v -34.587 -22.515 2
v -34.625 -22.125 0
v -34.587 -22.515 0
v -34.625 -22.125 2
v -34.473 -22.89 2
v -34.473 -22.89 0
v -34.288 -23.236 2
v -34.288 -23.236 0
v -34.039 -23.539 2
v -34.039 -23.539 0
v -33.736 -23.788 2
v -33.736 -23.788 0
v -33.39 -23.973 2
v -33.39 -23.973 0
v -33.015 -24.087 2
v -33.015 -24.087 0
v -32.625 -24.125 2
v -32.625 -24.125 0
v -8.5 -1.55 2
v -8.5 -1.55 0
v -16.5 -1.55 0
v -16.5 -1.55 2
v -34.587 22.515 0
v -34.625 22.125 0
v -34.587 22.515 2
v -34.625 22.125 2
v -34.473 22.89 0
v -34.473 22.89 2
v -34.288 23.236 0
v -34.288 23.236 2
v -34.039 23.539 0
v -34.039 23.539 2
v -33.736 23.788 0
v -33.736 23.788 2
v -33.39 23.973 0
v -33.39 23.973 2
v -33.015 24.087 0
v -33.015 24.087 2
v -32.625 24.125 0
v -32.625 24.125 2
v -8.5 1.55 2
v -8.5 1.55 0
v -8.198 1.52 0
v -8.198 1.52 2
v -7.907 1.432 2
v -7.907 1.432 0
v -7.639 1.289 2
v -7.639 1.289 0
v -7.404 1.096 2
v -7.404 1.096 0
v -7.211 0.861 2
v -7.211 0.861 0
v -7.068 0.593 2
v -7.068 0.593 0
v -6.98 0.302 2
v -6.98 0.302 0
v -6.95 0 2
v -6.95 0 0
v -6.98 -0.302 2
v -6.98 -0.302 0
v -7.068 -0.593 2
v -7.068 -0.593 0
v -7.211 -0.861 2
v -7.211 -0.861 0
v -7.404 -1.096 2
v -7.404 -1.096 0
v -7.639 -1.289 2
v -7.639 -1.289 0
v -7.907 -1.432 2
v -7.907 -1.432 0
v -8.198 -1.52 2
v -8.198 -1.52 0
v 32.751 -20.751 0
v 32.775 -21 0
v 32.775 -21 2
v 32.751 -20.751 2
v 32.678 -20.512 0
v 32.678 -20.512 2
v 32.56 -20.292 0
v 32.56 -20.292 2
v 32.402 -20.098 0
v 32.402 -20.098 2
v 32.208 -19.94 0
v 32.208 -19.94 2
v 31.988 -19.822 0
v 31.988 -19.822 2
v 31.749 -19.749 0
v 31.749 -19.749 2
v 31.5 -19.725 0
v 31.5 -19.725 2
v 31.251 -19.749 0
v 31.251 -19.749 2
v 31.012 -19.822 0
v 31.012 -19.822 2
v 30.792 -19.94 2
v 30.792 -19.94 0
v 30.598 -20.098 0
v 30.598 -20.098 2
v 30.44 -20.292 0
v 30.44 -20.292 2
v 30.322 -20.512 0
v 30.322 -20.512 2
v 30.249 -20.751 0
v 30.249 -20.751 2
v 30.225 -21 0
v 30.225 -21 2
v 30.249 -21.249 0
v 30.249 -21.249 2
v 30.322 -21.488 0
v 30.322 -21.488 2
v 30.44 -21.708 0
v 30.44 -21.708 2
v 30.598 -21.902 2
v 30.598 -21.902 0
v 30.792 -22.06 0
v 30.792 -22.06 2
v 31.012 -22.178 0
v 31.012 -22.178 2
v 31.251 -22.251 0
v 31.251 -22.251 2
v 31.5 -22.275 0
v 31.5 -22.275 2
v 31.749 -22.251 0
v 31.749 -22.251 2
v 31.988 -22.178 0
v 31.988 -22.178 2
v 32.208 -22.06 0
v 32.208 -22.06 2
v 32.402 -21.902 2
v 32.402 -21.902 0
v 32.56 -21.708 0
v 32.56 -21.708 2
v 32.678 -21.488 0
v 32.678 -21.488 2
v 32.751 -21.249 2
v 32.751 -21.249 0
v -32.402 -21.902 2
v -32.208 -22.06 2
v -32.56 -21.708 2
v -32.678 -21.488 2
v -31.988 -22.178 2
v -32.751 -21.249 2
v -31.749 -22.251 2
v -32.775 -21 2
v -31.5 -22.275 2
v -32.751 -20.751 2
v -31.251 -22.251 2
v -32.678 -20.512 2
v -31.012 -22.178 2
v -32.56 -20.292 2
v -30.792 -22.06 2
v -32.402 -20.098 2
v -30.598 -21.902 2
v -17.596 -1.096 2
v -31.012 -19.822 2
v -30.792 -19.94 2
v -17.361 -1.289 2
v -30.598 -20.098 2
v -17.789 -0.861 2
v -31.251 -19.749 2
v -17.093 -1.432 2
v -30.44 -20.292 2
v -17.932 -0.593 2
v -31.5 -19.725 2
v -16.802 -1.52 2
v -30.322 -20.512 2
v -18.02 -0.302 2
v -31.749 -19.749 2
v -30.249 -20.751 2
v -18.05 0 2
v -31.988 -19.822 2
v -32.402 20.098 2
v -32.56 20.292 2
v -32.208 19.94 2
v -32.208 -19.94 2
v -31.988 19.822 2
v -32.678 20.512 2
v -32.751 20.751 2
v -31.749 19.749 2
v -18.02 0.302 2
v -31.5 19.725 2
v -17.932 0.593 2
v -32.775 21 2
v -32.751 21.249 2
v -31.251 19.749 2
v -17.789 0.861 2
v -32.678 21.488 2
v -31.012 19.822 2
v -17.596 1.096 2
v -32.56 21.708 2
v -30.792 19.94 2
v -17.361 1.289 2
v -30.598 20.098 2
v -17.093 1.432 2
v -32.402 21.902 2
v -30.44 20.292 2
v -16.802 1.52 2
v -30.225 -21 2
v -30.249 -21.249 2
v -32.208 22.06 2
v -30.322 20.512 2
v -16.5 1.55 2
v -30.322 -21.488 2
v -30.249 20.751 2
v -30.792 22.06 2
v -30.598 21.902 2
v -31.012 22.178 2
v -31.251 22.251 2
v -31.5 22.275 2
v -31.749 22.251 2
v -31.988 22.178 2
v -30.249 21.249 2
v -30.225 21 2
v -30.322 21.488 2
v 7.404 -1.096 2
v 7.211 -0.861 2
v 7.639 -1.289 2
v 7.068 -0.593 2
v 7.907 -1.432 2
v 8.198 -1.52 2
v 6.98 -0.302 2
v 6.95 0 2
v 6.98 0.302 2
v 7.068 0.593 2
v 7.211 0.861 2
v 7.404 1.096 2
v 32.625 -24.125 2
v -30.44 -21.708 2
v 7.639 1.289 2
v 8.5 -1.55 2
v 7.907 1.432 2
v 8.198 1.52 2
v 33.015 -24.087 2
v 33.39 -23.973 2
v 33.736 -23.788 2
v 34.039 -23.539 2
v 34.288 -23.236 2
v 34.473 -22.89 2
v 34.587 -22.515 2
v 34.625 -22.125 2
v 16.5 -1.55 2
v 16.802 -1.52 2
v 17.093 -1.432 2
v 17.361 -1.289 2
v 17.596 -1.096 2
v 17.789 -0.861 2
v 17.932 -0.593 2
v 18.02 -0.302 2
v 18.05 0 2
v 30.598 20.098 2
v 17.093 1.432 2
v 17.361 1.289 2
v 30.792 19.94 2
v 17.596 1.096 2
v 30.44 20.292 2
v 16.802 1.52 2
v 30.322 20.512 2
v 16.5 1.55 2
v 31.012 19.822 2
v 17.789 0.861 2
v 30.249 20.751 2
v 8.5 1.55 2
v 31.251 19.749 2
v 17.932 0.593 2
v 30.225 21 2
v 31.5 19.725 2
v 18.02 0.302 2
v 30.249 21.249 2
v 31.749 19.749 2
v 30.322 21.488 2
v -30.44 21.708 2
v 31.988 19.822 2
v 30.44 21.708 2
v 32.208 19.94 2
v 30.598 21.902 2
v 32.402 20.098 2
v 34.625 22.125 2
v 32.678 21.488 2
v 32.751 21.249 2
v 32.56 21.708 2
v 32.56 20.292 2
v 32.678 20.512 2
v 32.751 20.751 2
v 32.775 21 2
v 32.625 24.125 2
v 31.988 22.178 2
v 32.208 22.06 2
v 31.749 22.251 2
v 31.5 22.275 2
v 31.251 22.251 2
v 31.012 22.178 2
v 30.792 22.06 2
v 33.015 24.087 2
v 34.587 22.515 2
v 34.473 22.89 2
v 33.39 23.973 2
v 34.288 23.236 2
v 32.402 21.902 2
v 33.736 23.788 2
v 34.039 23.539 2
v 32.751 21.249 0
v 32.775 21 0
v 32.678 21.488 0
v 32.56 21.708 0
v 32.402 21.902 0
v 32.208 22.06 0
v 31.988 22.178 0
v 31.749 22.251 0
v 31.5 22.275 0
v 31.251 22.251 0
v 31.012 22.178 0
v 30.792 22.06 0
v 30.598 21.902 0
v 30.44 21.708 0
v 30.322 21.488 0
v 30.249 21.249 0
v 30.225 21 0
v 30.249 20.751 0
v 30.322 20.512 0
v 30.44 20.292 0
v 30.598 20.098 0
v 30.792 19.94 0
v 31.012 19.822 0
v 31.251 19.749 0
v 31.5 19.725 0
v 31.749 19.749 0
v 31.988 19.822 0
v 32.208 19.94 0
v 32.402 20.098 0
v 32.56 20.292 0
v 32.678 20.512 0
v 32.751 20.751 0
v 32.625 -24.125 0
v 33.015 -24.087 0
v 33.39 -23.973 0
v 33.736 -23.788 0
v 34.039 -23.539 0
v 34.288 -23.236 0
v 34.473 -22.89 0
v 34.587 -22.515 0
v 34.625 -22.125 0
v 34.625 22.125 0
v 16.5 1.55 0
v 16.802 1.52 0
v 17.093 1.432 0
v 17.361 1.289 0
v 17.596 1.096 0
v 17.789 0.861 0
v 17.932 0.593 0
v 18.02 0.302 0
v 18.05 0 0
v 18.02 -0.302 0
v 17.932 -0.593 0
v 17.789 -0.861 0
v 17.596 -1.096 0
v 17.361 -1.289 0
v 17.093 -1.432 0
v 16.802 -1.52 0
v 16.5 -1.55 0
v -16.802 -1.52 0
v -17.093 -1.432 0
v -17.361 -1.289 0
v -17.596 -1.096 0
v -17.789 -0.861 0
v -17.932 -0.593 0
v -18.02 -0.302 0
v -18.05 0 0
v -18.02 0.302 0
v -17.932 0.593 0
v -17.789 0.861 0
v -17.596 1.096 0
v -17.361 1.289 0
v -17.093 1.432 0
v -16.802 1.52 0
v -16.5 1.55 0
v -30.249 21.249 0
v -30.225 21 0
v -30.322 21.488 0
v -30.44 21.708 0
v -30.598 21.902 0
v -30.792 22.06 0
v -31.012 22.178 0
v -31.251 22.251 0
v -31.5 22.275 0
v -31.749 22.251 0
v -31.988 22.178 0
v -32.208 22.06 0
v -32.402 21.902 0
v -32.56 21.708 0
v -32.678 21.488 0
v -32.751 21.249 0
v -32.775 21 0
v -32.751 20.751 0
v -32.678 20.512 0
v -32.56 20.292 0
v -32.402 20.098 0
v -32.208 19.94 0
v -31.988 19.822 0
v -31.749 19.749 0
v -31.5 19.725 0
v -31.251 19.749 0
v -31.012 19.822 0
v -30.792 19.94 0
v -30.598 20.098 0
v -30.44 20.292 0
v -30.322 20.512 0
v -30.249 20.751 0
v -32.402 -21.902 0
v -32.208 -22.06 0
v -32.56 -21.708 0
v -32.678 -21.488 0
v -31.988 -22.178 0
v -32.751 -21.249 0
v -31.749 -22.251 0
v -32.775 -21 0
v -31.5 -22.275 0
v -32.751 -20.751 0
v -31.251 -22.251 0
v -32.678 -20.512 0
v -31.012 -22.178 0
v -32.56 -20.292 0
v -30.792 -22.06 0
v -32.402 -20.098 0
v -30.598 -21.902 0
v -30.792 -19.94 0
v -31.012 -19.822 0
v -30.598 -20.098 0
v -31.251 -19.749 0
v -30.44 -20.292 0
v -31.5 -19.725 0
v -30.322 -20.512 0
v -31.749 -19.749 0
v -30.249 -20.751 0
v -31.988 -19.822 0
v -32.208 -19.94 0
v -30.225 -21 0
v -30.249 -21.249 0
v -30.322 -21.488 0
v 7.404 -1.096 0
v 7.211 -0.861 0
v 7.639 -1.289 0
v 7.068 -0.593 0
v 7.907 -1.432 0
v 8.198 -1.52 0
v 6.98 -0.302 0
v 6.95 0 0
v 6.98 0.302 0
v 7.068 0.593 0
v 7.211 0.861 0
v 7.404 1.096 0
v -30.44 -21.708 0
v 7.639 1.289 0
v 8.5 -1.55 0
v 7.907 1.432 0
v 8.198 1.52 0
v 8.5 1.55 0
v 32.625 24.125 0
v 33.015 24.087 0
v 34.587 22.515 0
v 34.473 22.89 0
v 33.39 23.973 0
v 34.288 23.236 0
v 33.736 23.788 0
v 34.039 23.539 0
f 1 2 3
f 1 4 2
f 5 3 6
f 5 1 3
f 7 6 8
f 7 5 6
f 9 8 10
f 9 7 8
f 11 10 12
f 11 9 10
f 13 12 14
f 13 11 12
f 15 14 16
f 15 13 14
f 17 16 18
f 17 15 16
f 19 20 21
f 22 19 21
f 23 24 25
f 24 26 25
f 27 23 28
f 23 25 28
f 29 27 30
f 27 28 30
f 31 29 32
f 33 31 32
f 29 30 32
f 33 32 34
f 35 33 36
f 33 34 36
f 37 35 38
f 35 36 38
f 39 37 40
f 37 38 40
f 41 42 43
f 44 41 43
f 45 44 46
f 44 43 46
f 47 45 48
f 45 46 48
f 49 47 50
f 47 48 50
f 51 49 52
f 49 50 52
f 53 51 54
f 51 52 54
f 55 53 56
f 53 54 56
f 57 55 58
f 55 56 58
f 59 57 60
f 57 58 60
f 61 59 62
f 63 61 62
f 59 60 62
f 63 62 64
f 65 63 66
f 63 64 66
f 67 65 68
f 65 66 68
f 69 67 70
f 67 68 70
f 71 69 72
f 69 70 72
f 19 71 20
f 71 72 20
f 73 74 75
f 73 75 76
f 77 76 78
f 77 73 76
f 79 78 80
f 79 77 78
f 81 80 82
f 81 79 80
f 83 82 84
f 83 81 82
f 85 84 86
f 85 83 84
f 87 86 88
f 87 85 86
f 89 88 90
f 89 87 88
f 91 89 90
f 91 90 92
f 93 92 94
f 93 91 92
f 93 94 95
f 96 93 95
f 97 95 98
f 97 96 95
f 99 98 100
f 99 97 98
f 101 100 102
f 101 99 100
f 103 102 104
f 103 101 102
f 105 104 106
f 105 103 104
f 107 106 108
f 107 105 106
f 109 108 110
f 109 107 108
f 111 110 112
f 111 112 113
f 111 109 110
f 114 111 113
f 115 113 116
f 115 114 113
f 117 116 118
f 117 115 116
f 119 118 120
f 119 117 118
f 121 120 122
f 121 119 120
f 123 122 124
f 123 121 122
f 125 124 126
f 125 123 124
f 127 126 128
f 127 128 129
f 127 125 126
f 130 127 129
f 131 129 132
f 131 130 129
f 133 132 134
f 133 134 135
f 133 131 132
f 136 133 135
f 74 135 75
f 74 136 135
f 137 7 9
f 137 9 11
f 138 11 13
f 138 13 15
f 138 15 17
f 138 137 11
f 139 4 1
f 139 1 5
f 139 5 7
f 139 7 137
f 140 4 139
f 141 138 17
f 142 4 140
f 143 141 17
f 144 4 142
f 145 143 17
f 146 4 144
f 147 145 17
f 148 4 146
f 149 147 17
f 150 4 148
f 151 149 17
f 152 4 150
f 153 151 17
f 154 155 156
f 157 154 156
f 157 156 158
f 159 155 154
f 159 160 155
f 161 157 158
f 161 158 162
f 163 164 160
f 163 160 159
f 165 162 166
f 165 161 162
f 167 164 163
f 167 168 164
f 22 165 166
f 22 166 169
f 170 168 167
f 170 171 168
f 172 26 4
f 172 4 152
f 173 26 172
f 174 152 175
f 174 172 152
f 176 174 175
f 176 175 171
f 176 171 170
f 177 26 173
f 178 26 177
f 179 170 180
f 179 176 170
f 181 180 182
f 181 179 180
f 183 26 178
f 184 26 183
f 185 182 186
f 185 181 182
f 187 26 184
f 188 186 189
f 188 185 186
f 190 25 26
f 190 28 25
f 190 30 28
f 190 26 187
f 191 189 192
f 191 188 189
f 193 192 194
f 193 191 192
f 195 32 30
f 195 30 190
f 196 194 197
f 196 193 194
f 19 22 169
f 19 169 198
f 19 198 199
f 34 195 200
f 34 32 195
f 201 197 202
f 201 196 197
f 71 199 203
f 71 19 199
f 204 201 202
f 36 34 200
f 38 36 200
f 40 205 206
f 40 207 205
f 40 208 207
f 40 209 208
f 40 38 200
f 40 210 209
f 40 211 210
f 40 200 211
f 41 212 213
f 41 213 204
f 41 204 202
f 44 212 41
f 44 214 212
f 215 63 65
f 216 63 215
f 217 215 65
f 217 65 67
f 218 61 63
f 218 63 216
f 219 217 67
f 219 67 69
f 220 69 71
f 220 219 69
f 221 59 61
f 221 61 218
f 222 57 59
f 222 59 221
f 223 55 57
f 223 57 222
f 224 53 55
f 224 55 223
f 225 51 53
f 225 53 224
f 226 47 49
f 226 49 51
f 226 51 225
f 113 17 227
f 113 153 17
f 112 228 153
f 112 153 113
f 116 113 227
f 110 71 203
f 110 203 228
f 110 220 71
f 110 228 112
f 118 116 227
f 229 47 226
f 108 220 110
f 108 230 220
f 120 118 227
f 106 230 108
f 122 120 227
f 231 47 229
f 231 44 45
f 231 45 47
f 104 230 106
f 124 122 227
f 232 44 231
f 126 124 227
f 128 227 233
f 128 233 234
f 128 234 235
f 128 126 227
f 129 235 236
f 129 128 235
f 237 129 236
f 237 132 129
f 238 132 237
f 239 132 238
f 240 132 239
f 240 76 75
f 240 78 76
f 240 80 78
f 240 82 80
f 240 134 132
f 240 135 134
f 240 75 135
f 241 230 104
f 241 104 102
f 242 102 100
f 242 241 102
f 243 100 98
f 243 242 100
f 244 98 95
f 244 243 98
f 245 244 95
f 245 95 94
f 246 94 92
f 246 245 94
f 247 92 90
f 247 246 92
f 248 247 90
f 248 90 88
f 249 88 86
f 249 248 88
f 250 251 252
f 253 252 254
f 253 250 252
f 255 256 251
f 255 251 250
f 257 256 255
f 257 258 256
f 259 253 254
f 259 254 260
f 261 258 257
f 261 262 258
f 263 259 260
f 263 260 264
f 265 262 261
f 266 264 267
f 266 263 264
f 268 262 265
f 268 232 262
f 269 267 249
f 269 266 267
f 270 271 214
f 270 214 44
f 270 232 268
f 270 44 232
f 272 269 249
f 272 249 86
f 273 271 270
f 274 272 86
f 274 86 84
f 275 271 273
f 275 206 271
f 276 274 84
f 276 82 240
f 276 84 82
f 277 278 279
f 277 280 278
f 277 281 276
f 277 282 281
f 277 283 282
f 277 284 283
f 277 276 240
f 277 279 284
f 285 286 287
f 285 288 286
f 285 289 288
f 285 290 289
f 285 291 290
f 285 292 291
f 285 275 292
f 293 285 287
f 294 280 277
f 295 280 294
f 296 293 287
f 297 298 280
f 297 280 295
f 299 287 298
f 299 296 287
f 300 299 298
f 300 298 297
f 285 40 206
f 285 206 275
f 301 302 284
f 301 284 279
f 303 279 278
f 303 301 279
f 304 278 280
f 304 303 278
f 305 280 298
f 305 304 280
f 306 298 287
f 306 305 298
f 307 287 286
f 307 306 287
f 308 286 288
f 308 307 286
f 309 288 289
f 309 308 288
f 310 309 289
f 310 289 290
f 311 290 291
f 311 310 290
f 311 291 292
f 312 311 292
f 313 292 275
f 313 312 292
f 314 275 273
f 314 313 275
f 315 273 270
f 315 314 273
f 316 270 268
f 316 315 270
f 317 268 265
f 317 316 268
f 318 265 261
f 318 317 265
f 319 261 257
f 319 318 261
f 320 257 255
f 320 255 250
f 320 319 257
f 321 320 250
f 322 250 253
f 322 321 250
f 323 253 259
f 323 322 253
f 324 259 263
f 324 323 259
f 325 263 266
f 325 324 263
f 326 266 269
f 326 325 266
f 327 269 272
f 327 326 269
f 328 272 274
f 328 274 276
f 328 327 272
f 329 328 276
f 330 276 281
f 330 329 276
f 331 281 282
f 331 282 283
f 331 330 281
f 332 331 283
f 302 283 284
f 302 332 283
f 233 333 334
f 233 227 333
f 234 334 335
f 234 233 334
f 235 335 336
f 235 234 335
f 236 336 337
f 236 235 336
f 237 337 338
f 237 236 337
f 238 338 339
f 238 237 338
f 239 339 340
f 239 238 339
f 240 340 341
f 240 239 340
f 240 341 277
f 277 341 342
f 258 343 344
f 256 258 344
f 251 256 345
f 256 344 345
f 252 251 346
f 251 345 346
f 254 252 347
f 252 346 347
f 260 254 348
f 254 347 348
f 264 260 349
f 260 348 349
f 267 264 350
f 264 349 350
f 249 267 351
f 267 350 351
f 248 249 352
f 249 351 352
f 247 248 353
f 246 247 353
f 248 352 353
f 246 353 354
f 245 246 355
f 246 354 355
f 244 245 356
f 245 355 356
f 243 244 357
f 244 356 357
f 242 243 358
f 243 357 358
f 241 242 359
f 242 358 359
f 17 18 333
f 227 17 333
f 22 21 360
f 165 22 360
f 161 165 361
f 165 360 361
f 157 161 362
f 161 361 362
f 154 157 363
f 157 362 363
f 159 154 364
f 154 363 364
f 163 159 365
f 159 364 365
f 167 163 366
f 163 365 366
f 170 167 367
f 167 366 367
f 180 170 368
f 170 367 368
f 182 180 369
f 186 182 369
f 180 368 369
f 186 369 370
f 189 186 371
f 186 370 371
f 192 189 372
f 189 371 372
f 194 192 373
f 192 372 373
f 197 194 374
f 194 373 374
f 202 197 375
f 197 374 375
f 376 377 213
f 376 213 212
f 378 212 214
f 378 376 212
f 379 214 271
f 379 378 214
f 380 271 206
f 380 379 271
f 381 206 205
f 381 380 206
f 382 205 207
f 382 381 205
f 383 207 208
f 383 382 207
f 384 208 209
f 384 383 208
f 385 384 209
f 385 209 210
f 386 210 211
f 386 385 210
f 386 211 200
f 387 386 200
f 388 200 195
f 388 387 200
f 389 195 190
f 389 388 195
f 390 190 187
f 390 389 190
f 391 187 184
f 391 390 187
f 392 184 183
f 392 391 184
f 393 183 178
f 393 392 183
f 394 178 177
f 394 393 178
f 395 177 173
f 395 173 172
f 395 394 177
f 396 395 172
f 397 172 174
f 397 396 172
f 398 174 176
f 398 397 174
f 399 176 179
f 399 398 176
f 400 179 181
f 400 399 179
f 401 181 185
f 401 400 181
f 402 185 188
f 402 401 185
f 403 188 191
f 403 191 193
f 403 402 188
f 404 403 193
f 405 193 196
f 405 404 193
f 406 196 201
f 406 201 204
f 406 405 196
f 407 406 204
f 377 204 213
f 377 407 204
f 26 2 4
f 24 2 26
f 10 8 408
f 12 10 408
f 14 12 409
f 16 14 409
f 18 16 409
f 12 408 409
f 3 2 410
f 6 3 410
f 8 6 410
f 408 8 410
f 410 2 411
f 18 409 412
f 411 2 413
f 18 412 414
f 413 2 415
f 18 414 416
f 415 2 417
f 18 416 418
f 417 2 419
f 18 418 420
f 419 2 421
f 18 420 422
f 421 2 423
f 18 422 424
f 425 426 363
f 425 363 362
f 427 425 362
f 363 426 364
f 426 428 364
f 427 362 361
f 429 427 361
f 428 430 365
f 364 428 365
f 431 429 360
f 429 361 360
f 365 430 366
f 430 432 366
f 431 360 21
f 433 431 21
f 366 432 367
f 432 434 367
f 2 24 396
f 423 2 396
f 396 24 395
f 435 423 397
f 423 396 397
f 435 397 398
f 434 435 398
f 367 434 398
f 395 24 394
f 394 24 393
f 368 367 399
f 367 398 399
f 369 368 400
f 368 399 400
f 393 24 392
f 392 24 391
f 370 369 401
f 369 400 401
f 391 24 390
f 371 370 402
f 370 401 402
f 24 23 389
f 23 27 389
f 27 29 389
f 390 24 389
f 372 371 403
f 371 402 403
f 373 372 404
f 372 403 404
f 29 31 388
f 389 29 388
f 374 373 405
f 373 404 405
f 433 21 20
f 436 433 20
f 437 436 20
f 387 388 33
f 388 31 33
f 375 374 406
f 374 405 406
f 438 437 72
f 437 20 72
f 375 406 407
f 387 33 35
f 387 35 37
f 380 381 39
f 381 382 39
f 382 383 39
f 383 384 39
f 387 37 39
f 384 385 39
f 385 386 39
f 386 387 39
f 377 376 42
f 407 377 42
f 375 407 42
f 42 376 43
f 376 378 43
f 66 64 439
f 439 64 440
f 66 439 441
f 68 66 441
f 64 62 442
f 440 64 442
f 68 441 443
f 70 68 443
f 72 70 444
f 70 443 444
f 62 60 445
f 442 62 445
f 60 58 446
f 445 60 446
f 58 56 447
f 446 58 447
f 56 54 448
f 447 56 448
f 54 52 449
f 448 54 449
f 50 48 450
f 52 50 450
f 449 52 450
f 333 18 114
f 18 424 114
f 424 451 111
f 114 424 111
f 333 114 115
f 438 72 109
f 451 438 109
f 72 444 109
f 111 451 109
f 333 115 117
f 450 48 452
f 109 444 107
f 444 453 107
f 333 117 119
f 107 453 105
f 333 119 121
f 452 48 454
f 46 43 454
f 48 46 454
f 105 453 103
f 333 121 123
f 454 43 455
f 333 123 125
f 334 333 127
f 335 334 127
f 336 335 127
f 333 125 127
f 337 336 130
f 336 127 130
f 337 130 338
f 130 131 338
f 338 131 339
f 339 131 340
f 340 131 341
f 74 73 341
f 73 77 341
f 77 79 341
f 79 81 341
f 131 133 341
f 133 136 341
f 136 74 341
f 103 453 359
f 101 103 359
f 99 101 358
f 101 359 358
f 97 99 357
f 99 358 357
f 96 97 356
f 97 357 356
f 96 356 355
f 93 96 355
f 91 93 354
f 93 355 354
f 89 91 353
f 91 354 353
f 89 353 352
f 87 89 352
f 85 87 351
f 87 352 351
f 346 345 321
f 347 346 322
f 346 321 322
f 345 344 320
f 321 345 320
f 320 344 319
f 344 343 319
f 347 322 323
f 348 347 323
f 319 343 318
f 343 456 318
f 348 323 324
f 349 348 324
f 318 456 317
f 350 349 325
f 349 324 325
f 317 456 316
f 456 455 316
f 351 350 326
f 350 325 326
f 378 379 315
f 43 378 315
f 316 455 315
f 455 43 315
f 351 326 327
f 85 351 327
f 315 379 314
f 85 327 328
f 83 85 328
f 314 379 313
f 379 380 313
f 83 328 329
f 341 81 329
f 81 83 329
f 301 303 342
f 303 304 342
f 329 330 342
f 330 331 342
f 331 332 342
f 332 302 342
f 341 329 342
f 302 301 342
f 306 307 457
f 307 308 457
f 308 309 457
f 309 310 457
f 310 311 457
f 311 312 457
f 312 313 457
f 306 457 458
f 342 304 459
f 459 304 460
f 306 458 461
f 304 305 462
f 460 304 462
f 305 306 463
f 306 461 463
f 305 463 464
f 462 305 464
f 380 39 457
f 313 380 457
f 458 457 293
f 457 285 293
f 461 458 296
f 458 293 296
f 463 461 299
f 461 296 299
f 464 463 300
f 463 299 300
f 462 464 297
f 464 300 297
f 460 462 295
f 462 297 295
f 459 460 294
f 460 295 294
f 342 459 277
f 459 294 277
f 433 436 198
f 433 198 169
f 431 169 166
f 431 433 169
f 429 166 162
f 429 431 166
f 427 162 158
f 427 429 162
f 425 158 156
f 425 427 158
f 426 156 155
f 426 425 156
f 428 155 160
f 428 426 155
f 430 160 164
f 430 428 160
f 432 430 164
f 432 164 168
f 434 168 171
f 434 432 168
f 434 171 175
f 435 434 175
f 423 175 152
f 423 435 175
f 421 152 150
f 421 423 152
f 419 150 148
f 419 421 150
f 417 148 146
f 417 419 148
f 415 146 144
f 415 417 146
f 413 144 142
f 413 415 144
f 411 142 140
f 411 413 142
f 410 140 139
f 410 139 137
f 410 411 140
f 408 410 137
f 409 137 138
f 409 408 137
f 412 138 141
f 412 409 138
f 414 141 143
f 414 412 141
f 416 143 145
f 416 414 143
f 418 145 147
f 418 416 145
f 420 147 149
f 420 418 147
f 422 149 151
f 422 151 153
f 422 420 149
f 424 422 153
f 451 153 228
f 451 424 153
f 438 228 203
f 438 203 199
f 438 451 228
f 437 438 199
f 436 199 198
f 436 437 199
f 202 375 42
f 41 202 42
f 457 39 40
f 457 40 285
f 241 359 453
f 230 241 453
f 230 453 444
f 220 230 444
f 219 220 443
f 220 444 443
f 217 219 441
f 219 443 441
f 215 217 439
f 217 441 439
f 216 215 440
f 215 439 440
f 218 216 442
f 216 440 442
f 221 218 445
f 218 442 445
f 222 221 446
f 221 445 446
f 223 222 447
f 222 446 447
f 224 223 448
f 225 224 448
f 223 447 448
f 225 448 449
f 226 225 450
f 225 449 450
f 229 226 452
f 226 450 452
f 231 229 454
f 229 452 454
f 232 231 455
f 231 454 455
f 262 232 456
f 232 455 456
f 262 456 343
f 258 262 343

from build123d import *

# Parameters (mm, degrees)
SKETCH_1_W      = 69.25
SKETCH_1_H      = 48.25
SKETCH_1_R      = 1.275
EXTRUDE_1_DEPTH = 2
FILLET_1_R      = 2


with BuildPart() as part:
    # 草图1 → 凸台-拉伸1 (new body)
    with BuildSketch(Plane.XY):
        Rectangle(SKETCH_1_W, SKETCH_1_H)
        with Locations((-31.5, 21)):
            Circle(SKETCH_1_R, mode=Mode.SUBTRACT)
        with Locations((31.5, 21)):
            Circle(SKETCH_1_R, mode=Mode.SUBTRACT)
        with Locations((-31.5, -21)):
            Circle(SKETCH_1_R, mode=Mode.SUBTRACT)
        with Locations((31.5, -21)):
            Circle(SKETCH_1_R, mode=Mode.SUBTRACT)
        with BuildLine():
            Line((-16.5, 1.55), (-8.5, 1.55))
            ThreePointArc((-8.5, 1.55), (-6.95, 0), (-8.5, -1.55))
            Line((-8.5, -1.55), (-16.5, -1.55))
            ThreePointArc((-16.5, -1.55), (-18.05, 0), (-16.5, 1.55))
        make_face(mode=Mode.SUBTRACT)
        with BuildLine():
            Line((16.5, -1.55), (8.5, -1.55))
            ThreePointArc((8.5, -1.55), (6.95, 0), (8.5, 1.55))
            Line((8.5, 1.55), (16.5, 1.55))
            ThreePointArc((16.5, 1.55), (18.05, 0), (16.5, -1.55))
        make_face(mode=Mode.SUBTRACT)
    extrude(amount=EXTRUDE_1_DEPTH)

    # 圆角1
    fillet_1_edges = [part.edges().sort_by_distance(p)[0] for p in [
        (-34.625, 24.125, 1),
        (34.625, 24.125, 1),
        (34.625, -24.125, 1),
        (-34.625, -24.125, 1),
    ]]
    fillet(fillet_1_edges, radius=FILLET_1_R)


solid = part.part
